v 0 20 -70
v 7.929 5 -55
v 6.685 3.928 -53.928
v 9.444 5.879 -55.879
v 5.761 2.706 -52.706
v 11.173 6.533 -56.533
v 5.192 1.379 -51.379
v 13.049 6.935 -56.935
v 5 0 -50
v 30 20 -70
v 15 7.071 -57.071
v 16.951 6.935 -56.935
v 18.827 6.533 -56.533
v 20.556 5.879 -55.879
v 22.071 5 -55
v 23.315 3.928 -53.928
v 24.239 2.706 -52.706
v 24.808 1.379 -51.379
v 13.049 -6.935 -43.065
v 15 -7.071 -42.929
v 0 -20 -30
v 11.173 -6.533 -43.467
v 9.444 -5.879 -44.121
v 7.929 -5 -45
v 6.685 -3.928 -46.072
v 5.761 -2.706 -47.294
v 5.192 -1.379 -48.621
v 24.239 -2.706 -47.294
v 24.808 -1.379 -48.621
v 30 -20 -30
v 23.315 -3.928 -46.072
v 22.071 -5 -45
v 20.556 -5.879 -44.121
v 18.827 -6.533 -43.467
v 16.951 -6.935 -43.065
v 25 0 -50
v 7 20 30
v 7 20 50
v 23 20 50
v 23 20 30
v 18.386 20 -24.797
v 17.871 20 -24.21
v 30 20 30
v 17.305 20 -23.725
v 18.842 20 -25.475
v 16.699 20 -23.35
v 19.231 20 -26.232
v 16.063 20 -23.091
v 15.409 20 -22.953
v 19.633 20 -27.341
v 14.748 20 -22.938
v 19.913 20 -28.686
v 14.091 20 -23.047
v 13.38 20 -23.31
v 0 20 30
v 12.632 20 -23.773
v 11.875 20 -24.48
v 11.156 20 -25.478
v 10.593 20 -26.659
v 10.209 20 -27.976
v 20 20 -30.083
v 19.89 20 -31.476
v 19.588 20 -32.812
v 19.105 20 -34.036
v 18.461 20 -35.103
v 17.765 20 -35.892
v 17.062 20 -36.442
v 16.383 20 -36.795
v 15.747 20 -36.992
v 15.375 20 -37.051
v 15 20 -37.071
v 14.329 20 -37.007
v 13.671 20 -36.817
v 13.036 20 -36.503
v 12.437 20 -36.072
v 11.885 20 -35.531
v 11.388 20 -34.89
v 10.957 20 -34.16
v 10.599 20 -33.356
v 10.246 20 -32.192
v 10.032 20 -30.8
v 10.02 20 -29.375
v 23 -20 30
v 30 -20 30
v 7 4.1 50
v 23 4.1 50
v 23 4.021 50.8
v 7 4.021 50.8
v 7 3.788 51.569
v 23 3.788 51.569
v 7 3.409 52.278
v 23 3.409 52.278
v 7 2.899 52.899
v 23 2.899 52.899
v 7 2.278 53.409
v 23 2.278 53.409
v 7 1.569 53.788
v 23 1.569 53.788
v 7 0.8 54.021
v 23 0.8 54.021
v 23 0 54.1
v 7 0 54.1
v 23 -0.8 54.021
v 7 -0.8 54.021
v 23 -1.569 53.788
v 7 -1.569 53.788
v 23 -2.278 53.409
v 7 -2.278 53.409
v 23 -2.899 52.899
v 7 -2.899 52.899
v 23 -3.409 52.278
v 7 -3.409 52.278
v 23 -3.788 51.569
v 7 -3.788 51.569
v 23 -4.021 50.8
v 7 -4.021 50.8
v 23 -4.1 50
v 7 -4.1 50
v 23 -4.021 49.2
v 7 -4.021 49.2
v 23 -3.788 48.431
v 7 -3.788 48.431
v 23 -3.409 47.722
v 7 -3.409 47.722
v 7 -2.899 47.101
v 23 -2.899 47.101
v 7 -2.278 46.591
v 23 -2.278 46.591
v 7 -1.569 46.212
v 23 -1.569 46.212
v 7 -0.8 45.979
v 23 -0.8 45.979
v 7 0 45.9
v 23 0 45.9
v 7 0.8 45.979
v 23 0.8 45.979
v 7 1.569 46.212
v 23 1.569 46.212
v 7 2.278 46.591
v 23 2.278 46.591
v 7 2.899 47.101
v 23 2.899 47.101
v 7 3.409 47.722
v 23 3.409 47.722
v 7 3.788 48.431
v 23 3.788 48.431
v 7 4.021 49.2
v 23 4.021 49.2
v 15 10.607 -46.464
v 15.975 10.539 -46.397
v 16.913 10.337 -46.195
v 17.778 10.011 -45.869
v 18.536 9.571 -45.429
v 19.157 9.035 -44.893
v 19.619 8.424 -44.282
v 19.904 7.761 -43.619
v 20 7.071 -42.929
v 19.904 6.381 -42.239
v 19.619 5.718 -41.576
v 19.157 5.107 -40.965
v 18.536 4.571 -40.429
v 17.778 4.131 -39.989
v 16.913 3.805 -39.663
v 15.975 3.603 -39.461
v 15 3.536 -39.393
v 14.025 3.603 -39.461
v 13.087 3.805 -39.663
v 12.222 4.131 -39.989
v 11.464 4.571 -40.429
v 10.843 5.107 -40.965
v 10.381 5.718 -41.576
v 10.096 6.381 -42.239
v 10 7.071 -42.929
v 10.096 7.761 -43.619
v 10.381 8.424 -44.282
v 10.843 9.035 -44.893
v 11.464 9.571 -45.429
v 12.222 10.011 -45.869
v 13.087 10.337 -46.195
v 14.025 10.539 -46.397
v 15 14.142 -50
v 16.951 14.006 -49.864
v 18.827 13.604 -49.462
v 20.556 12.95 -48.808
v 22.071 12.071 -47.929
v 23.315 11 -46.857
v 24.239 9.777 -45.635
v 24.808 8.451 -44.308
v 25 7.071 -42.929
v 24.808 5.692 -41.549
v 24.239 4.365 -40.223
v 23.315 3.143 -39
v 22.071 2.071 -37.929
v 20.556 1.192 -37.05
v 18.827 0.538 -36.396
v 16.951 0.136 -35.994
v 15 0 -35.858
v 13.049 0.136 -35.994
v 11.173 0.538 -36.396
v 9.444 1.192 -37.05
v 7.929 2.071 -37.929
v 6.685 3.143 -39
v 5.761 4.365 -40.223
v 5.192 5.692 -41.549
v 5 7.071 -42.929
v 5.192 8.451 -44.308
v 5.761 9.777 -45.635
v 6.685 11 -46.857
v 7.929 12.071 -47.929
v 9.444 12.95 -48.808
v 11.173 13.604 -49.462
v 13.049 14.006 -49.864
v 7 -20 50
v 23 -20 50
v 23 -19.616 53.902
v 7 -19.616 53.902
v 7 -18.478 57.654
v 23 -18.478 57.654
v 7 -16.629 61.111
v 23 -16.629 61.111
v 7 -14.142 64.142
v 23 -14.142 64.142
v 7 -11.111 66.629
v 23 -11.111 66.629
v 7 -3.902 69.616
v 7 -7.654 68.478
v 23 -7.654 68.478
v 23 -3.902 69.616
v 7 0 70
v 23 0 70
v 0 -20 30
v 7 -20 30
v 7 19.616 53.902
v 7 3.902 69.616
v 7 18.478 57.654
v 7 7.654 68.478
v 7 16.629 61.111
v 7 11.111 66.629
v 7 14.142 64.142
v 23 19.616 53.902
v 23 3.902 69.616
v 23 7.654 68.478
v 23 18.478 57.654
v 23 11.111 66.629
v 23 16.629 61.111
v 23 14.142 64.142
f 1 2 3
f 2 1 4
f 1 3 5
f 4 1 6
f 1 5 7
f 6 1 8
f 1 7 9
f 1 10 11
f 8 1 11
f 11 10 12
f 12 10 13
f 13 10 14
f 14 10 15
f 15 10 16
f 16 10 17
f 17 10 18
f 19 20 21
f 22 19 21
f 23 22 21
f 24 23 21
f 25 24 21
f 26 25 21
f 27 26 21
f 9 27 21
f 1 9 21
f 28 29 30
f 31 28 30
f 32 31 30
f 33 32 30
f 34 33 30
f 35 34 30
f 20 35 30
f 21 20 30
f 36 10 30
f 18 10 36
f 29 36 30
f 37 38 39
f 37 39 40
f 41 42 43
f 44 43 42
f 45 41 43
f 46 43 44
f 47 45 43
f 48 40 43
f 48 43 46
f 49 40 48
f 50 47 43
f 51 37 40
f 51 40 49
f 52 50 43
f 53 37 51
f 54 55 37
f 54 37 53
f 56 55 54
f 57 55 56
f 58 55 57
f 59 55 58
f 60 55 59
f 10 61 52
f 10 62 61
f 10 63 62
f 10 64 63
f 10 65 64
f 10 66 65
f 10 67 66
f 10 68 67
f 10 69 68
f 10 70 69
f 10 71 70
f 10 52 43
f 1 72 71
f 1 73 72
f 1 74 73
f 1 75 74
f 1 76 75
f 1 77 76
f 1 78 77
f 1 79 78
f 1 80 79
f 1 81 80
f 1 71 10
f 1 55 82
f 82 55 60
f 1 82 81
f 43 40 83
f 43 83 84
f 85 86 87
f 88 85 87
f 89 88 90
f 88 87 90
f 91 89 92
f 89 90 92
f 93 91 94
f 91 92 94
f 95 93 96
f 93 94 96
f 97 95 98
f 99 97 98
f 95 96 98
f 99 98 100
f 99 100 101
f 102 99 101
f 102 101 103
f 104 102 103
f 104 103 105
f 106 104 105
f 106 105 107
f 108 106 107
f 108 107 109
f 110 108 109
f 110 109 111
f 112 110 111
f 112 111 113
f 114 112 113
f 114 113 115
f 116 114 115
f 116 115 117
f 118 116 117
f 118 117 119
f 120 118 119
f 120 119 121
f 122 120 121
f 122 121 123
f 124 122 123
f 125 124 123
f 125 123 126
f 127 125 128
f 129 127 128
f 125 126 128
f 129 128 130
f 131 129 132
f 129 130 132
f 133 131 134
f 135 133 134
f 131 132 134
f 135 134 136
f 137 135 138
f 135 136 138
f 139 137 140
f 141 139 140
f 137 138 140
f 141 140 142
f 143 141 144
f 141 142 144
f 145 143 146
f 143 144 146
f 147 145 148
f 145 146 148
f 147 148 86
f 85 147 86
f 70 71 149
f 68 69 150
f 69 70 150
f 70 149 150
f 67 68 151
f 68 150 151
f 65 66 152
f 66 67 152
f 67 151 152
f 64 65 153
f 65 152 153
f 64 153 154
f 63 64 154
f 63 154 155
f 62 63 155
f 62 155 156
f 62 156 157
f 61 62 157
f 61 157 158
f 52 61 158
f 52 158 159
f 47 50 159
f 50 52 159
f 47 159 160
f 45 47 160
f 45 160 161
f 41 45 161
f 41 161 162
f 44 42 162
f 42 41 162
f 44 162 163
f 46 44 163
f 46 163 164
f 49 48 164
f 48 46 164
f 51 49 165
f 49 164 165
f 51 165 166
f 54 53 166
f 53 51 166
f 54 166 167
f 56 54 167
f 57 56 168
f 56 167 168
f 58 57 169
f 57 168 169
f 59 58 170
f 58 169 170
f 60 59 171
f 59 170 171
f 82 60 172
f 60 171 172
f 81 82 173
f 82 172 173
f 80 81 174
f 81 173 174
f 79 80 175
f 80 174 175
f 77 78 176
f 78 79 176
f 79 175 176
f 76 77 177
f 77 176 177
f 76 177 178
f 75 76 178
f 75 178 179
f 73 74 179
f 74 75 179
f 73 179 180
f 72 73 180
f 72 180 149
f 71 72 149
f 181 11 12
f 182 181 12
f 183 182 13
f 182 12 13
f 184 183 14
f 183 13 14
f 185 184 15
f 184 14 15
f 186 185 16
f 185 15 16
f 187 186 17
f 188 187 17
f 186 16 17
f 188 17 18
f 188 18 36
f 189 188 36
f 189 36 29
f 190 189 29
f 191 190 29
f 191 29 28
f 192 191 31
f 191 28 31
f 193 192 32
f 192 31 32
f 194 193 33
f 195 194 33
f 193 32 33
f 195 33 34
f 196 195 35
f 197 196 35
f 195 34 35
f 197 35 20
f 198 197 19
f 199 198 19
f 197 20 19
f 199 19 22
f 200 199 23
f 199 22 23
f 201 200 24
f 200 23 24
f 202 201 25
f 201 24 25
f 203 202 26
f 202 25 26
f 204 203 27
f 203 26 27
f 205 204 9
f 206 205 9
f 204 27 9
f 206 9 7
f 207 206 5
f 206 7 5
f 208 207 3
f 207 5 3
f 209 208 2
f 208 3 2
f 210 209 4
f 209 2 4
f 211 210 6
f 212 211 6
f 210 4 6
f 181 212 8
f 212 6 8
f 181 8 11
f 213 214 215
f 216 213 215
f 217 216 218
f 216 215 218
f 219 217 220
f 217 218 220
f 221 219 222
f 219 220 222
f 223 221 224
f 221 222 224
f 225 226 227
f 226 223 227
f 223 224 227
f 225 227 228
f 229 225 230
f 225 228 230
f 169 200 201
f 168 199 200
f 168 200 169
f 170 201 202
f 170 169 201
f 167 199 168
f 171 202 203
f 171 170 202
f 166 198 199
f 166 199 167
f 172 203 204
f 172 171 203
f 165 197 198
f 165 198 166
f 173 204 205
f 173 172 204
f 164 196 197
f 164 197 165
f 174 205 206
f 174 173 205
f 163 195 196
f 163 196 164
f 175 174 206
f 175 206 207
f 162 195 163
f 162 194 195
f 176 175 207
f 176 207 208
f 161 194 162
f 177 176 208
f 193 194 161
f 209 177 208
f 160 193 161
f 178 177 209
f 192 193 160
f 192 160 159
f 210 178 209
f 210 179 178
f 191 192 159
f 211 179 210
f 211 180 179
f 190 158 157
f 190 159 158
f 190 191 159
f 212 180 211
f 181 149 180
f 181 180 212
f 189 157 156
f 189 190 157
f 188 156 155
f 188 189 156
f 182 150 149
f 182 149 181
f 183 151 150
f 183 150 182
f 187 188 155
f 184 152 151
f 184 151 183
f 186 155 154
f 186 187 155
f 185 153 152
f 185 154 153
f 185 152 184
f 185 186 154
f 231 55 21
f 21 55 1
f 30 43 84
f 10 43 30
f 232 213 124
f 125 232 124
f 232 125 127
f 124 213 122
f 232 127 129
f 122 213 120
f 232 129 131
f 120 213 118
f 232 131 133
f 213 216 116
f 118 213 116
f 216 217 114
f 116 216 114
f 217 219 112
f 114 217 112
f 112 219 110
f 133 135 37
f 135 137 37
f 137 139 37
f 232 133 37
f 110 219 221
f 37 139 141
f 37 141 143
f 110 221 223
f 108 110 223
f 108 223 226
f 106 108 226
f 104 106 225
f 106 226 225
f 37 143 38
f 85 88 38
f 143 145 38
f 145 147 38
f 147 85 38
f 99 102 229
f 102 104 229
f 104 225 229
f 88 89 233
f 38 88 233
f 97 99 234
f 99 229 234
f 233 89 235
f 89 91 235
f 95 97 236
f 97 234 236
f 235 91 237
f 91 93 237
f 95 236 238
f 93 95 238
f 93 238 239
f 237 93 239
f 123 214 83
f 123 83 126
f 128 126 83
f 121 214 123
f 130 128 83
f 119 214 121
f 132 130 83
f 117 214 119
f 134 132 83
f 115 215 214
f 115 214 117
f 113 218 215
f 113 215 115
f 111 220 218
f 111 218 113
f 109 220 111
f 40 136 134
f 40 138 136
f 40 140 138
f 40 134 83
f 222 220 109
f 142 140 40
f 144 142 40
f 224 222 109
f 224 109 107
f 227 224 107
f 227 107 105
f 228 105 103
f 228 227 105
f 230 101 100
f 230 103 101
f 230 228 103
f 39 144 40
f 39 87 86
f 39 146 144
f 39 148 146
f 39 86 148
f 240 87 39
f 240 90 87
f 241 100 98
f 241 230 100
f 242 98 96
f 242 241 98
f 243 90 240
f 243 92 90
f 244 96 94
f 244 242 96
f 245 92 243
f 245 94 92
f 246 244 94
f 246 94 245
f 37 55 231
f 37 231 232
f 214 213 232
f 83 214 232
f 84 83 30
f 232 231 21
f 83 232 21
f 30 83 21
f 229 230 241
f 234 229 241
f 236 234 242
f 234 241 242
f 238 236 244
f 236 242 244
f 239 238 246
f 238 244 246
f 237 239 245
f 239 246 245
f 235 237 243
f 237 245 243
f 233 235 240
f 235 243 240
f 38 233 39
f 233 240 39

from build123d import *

# Parameters (mm, degrees)
SKETCH6_W           = 140
SKETCH6_H           = 40
BOSS_EXTRUDE2_DEPTH = 30
SKETCH9_W           = 7
SKETCH9_H           = 40
CUT_EXTRUDE3_DEPTH  = 40
CUT_EXTRUDE6_DEPTH  = 45
CUT_EXTRUDE7_DEPTH  = 45
SKETCH22_R          = 4.1
CUT_EXTRUDE8_DEPTH  = 45
CUT_EXTRUDE9_DEPTH  = 45
SKETCH26_R          = 10
CUT_EXTRUDE10_DEPTH = 10
SKETCH28_R          = 5
CUT_EXTRUDE11_DEPTH = 35


with BuildPart() as part:
    # Sketch6 → Boss-Extrude2 (new body)
    with BuildSketch(Plane(origin=(0, 0, 0), x_dir=(0, 0, -1), z_dir=(1, 0, 0))):
        Rectangle(SKETCH6_W, SKETCH6_H)
    extrude(amount=BOSS_EXTRUDE2_DEPTH)

    # Sketch9 → Cut-Extrude3 (cut)
    with BuildSketch(Plane.XY.offset(70)):
        with Locations((3.5, 0)):
            Rectangle(SKETCH9_W, SKETCH9_H)
        with Locations((26.5, 0)):
            Rectangle(SKETCH9_W, SKETCH9_H)
    extrude(amount=-CUT_EXTRUDE3_DEPTH, mode=Mode.SUBTRACT)

    # Sketch18 → Cut-Extrude6 (cut)
    with BuildSketch(Plane(origin=(23, 0, 0), x_dir=(0, 0, -1), z_dir=(1, 0, 0))):
        with BuildLine():
            Line((-70, 20), (-70, 0))
            ThreePointArc((-70, 0), (-64.142135624, 14.142135624), (-50, 20))
            Line((-50, 20), (-70, 20))
        make_face()
    extrude(amount=-CUT_EXTRUDE6_DEPTH, mode=Mode.SUBTRACT)

    # Sketch19 → Cut-Extrude7 (cut)
    with BuildSketch(Plane(origin=(23, 0, 0), x_dir=(0, 0, -1), z_dir=(1, 0, 0))):
        with BuildLine():
            Line((-70, 0), (-70, -20))
            Line((-70, -20), (-50, -20))
            ThreePointArc((-50, -20), (-64.142135624, -14.142135624), (-70, 0))
        make_face()
    extrude(amount=-CUT_EXTRUDE7_DEPTH, mode=Mode.SUBTRACT)

    # Sketch22 → Cut-Extrude8 (cut)
    with BuildSketch(Plane(origin=(23, 0, 0), x_dir=(0, 0, -1), z_dir=(1, 0, 0))):
        with Locations(Location((-50, 0, 0), (0, 0, 90))):
            Circle(SKETCH22_R)
    extrude(amount=-CUT_EXTRUDE8_DEPTH, mode=Mode.SUBTRACT)

    # Sketch24 → Cut-Extrude9 (cut)
    with BuildSketch(Plane(origin=(30, 0, 0), x_dir=(0, 0, -1), z_dir=(1, 0, 0))):
        Polygon((70, 20), (30, -20), (70, -20), align=None)
    extrude(amount=-CUT_EXTRUDE9_DEPTH, mode=Mode.SUBTRACT)

    # Sketch26 → Cut-Extrude10 (cut)
    with BuildSketch(Plane(origin=(0, -25, -25), x_dir=(1, 0, 0), z_dir=(0, -0.707106781186551, -0.7071067811865441))):
        with Locations(Location((15, -35.355339059, 0), (0, 0, 270))):
            Circle(SKETCH26_R)
    extrude(amount=-CUT_EXTRUDE10_DEPTH, mode=Mode.SUBTRACT)

    # Sketch28 → Cut-Extrude11 (cut)
    with BuildSketch(Plane(origin=(0, -17.928932188, -17.928932188), x_dir=(1, 0, 0), z_dir=(0, -0.7071067811865509, -0.7071067811865442))):
        with Locations(Location((15, -35.355339059, 0), (0, 0, 270))):
            Circle(SKETCH28_R)
    extrude(amount=-CUT_EXTRUDE11_DEPTH, mode=Mode.SUBTRACT)


solid = part.part
